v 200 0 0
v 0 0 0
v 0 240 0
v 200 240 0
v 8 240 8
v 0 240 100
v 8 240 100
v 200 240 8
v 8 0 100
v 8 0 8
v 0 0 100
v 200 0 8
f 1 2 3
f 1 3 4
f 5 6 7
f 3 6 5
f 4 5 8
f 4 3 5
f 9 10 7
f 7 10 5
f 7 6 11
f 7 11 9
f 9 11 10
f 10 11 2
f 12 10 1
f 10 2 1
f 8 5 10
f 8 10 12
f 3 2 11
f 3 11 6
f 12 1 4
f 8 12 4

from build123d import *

# Parameters (mm, degrees)
SKETCH_1_W          = 200
SKETCH_1_H          = 240
SKETCH_1_R          = 13
EXTRUDE_393_DEPTH   = 8
SKETCH_2_W          = 8
SKETCH_2_H          = 240
EXTRUDE_1_DEPTH     = 92
SKETCH_3_R          = 13
CUT_EXTRUDE_1_DEPTH = 329.024389337
SKETCH_5_W          = 192
SKETCH_5_H          = 240
EXTRUDE_2_DEPTH     = 8
SKETCH_6_W          = 92
SKETCH_6_H          = 240
EXTRUDE_3_DEPTH     = 8


with BuildPart() as part:
    # 草图1 → Extrude 393 (new body)
    with BuildSketch(Plane.XY):
        with Locations((100, 120)):
            Rectangle(SKETCH_1_W, SKETCH_1_H)
        with Locations((160, 40)):
            Circle(SKETCH_1_R, mode=Mode.SUBTRACT)
        with Locations((160, 120)):
            Circle(SKETCH_1_R, mode=Mode.SUBTRACT)
        with Locations((160, 200)):
            Circle(SKETCH_1_R, mode=Mode.SUBTRACT)
    extrude(amount=EXTRUDE_393_DEPTH)

    # 草图2 → 凸台-拉伸1 (add)
    with BuildSketch(Plane.XY.offset(8)):
        with Locations((4, 120)):
            Rectangle(SKETCH_2_W, SKETCH_2_H)
    extrude(amount=EXTRUDE_1_DEPTH)

    # 草图3 → 切除-拉伸1 (cut, through all)
    with BuildSketch(Plane.ZY):
        with Locations((52, 200)):
            Circle(SKETCH_3_R)
        with Locations((52, 120)):
            Circle(SKETCH_3_R)
        with Locations((52, 40)):
            Circle(SKETCH_3_R)
    extrude(amount=-CUT_EXTRUDE_1_DEPTH, mode=Mode.SUBTRACT)

    # 草图5 → 凸台-拉伸2 (add)
    with BuildSketch(Plane.XY.offset(8)):
        with Locations((104, 120)):
            Rectangle(SKETCH_5_W, SKETCH_5_H)
    extrude(amount=-EXTRUDE_2_DEPTH)

    # 草图6 → 凸台-拉伸3 (add)
    with BuildSketch(Plane(origin=(8, 0, 0), x_dir=(0, 0, -1), z_dir=(1, 0, 0))):
        with Locations((-54, 120)):
            Rectangle(SKETCH_6_W, SKETCH_6_H)
    extrude(amount=-EXTRUDE_3_DEPTH)


solid = part.part
